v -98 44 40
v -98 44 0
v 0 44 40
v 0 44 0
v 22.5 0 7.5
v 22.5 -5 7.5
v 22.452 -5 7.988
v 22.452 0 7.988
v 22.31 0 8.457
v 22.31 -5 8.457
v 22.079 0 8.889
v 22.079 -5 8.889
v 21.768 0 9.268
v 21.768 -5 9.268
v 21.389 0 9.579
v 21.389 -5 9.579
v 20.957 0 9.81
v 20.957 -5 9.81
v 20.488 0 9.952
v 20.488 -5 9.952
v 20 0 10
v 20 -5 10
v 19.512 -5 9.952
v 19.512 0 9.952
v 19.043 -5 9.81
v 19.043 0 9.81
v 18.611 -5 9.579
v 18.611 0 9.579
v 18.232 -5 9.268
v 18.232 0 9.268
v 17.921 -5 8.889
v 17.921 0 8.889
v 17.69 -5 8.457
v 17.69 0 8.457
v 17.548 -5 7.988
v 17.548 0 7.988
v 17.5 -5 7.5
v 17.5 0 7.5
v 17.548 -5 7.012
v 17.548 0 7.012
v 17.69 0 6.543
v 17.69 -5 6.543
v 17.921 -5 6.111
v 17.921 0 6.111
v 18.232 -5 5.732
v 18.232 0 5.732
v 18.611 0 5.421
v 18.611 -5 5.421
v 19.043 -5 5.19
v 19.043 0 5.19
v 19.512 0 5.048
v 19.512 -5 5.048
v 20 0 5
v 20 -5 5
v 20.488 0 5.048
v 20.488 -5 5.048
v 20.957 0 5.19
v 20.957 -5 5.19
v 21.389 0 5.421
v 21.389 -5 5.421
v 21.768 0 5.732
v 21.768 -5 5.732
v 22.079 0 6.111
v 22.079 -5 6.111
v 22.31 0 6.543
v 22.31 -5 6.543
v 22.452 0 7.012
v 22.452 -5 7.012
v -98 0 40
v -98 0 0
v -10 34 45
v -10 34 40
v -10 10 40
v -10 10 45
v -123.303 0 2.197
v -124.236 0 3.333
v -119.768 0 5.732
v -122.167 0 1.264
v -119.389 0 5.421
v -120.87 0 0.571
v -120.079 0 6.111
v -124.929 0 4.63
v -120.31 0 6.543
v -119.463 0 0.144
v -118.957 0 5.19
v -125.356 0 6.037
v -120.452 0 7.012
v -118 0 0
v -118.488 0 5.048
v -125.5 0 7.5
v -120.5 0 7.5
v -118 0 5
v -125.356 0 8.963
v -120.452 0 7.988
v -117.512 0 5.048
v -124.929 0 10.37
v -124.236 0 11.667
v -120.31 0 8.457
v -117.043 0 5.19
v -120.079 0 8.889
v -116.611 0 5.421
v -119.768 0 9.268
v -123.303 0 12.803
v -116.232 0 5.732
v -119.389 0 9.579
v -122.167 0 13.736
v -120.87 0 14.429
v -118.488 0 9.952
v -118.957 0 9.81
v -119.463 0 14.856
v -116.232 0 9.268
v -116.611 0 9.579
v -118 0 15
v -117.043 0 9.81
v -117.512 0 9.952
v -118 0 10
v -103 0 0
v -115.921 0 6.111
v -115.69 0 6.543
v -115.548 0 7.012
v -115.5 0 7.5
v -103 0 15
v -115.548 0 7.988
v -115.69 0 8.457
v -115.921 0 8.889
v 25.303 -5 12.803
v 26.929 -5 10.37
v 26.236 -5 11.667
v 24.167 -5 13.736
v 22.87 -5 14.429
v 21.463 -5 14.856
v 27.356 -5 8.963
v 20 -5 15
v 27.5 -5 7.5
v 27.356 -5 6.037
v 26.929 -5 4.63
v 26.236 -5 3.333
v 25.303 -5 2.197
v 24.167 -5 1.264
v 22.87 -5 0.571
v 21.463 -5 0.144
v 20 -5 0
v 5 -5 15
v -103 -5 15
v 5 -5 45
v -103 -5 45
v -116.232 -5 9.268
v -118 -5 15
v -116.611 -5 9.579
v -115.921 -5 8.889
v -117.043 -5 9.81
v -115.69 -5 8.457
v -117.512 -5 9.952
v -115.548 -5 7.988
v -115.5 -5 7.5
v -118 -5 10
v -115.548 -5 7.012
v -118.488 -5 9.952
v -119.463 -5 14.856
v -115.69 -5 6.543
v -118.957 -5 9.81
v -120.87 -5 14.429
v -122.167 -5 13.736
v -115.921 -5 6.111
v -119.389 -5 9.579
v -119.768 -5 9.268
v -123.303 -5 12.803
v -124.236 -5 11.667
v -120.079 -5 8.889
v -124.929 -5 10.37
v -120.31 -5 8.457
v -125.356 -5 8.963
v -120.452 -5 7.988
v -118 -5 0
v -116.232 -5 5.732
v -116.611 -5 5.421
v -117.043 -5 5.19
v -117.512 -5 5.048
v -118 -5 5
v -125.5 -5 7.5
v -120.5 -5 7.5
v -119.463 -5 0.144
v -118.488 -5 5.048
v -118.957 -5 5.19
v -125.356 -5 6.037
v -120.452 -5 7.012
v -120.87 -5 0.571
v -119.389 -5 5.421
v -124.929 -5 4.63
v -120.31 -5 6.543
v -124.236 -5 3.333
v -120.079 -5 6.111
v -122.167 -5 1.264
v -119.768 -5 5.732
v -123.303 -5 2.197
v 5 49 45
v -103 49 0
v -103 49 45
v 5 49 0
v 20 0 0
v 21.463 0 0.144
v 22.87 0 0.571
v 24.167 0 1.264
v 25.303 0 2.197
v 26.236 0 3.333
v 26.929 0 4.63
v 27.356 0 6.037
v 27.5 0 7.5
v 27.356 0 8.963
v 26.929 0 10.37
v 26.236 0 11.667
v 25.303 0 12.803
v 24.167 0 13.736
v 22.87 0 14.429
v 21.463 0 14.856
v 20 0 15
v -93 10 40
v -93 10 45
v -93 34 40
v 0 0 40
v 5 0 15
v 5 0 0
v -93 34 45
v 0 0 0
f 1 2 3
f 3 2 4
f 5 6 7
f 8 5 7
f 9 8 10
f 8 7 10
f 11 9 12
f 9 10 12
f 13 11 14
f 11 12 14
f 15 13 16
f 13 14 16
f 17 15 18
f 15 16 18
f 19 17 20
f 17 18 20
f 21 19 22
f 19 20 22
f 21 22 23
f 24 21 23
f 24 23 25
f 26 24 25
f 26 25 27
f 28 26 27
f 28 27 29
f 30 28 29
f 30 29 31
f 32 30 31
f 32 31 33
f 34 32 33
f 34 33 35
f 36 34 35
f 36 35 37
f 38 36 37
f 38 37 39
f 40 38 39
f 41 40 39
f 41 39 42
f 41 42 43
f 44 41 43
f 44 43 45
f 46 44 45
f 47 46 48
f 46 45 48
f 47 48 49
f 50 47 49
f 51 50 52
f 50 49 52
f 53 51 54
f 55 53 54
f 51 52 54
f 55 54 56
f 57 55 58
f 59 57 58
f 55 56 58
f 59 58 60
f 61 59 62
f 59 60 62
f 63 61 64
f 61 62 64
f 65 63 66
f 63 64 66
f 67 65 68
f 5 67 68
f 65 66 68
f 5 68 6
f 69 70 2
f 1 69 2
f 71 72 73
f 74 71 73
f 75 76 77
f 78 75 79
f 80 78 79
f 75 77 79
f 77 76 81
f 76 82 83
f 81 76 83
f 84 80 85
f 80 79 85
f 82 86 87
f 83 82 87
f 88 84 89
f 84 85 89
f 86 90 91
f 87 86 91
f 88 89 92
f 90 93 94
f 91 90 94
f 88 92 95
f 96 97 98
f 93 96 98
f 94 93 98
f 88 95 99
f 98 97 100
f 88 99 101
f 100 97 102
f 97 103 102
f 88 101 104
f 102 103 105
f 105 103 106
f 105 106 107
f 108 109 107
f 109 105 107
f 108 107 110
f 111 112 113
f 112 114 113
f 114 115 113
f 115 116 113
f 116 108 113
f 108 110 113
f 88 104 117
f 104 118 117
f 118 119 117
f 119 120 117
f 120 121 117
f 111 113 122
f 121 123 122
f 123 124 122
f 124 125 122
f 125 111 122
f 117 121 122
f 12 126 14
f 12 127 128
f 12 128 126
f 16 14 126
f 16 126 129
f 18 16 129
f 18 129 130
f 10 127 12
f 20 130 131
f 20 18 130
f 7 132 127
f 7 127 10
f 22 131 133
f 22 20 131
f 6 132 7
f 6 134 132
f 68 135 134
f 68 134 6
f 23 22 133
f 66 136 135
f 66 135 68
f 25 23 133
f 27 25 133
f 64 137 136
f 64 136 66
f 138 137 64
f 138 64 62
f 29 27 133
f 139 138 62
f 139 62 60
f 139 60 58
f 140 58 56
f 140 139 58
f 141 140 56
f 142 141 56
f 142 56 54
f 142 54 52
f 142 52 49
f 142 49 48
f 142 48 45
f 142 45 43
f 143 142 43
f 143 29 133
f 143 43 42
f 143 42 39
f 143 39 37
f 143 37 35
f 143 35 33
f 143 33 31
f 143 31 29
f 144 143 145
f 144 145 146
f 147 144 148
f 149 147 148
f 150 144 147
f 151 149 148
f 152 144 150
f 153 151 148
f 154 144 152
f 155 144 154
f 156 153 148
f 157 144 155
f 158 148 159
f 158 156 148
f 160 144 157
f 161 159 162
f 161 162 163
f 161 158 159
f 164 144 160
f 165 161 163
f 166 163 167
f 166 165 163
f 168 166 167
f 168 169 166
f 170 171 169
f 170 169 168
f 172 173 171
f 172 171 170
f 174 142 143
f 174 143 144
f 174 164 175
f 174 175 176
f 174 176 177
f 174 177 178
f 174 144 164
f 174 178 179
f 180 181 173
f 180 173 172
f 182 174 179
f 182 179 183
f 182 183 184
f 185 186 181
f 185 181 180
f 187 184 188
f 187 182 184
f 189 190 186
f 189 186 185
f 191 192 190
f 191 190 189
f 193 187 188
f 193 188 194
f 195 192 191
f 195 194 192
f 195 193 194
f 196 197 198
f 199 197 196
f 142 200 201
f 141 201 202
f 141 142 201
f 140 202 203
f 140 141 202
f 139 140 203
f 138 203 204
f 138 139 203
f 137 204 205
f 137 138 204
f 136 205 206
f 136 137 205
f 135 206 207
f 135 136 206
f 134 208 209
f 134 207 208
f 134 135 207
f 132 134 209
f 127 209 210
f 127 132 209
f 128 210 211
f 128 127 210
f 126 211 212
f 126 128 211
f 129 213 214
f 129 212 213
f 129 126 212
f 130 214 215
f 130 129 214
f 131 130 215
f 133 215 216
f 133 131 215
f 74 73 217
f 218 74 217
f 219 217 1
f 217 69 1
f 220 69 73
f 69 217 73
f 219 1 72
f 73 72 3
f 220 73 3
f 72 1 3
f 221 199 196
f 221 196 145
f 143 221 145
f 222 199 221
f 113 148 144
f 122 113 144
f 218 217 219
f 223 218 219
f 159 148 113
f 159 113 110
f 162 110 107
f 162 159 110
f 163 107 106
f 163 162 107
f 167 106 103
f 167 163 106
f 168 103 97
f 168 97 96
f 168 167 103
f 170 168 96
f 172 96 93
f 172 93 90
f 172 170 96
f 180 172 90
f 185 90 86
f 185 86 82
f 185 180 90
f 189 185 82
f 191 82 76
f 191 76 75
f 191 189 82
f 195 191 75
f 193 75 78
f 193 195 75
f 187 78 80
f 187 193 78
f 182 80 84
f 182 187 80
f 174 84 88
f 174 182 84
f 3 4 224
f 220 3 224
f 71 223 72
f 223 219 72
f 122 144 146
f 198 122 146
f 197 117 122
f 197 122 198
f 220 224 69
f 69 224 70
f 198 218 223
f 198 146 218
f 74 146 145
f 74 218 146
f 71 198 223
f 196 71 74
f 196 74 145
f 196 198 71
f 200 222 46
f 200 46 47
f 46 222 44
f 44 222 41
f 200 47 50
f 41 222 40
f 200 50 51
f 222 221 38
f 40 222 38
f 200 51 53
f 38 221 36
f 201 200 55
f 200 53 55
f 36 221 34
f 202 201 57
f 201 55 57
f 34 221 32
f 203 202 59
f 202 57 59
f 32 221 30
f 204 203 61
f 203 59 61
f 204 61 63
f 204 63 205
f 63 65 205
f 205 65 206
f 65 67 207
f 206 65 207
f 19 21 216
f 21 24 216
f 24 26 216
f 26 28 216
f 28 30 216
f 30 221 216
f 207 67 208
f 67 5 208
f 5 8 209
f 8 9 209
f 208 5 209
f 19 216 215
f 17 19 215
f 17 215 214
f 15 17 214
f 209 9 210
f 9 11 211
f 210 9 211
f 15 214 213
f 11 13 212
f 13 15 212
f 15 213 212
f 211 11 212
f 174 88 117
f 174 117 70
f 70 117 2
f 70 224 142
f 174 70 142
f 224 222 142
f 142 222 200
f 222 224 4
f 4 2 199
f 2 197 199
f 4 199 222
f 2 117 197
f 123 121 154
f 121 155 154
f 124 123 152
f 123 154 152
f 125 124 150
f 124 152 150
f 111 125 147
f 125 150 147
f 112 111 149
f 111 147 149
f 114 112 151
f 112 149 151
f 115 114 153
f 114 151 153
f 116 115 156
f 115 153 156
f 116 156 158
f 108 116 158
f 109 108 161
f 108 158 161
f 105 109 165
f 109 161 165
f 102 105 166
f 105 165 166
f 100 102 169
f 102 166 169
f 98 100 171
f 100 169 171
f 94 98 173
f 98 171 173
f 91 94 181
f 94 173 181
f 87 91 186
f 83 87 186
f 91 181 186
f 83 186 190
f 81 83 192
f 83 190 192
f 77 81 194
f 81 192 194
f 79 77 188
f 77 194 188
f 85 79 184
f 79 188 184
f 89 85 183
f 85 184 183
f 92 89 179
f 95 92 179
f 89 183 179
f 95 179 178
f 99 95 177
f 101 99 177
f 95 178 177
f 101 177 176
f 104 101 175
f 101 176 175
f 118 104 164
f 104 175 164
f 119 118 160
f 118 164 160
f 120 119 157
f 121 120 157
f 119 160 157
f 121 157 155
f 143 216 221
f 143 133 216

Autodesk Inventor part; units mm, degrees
ref_plane "YZ Plane" through (0, 0, 0) normal (1, 0, 0) x (0, 1, 0)
ref_plane "XZ Plane" through (0, 0, 0) normal (0, 1, 0) x (-1, 0, 0)
ref_plane "XY Plane" through (0, 0, 0) normal (0, 0, 1) x (1, 0, 0)
sketch "Sketch1" plane through (0, 0, 0) normal (0, 0, 1) x (1, 0, 0)
  line L0 (0, 0) -> (-98, 0)
  line L1 (-98, 0) -> (-98, 44)
  line L2 (-98, 44) -> (0, 44)
  line L3 (0, 44) -> (0, 0)
  line L4 (5, -5) -> (-103, -5)
  line L5 (-103, -5) -> (-103, 49)
  line L6 (-103, 49) -> (5, 49)
  line L7 (5, 49) -> (5, -5)
  dimension "d0" = 98
  dimension "d1" = 44
  dimension "d2" = 5
  dimension "d3" = 5
  dimension "d4" = 5
  dimension "d5" = 5
extrude "Extrusion1" add sketch "Sketch1" along normal blind 40
sketch "Sketch2" plane through (0, 0, 40) normal (0, 0, 1) x (1, 0, 0)
  line L0 (5, 49) -> (-103, 49) projected
  line L1 (5, -5) -> (-103, -5)
  line L2 (-103, -5) -> (-103, 49)
  line L3 (-103, 49) -> (5, 49)
  line L4 (5, 49) -> (5, -5)
  line L5 (-93, 34) -> (-10, 34)
  line L6 (-10, 34) -> (-10, 10)
  line L7 (-10, 10) -> (-93, 10)
  line L8 (-93, 10) -> (-93, 34)
  point P0 (0, 0)
  dimension "d10" = 10
  dimension "d11" = 15
  dimension "d12" = 15
  dimension "d13" = 15
extrude "Extrusion2" add sketch "Sketch2" along normal blind 5
sketch "Sketch3" plane through (-103, -5, 0) normal (0, -1, 0) x (1, 0, 0)
  line L0 (108, 0) -> (108, 45) projected
  line L1 (108, 0) -> (123, 0)
  line L2 (123, 0) -> (123, 15)
  line L3 (123, 15) -> (108, 15)
  line L4 (108, 15) -> (108, 0)
  circle A0 centre (123, 7.5) radius 7.5
  circle A1 centre (123, 7.5) radius 2.5
  line L5 (108, 45) -> (0, 45) projected
  line L6 (54, 45) -> (54, 61.5977)
  line L7 (0, 0) -> (-15, 0)
  line L8 (-15, 0) -> (-15, 15)
  line L9 (-15, 15) -> (0, 15)
  line L10 (0, 15) -> (0, 0)
  circle A2 centre (-15, 7.5) radius 7.5
  circle A3 centre (-15, 7.5) radius 2.5
  point P0 (103, 0)
  point P1 (5, 0)
  dimension "d14" = 15
  dimension "d15" = 15
  dimension "d16" = 5
extrude "Extrusion3" add sketch "Sketch3" against normal blind 5 contours L0 L3 A0 L1 | A0 L2 A1 | L2 A1 A0 | L7 A2 L9 L10 | A2 L8 A3 | L8 A3 A2
properties part number "PSUBracket"
